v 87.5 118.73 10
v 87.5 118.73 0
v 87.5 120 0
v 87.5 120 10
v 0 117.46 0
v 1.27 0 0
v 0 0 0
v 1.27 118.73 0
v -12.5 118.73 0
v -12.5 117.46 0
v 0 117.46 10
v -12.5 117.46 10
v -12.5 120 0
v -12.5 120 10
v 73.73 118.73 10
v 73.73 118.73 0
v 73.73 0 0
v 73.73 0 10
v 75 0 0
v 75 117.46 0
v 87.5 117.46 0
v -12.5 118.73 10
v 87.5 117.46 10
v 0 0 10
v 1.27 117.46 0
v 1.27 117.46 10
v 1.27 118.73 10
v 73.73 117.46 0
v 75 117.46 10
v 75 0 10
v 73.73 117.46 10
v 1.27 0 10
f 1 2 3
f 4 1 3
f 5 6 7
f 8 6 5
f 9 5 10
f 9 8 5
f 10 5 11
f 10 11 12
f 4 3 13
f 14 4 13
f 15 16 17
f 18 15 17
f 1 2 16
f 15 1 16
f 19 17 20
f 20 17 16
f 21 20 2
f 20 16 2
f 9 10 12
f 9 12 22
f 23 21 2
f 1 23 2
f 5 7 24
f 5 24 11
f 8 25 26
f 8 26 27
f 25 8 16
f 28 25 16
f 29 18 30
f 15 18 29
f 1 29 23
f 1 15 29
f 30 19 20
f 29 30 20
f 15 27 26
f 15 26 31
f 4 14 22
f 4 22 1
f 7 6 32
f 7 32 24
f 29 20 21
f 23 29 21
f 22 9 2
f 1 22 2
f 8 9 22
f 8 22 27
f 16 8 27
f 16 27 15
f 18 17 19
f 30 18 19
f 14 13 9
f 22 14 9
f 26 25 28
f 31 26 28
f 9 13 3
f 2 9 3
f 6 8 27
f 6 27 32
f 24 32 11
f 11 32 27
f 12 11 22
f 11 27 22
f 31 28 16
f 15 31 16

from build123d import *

# Parameters (mm, degrees)
BOSS_EXTRUDE1_DEPTH   = 10
BOSS_EXTRUDE1_2_DEPTH = 10
SKETCH2_4_W           = 72.46
SKETCH2_4_H           = 1.27
BOSS_EXTRUDE2_DEPTH   = 10
BOSS_EXTRUDE3_DEPTH   = 10


with BuildPart() as part:
    # Sketch2 → Boss-Extrude1 (new body)
    with BuildSketch(Plane.XY):
        Polygon((0, 117.46), (0, 0), (1.27, 0), (1.27, 118.73), (-12.5, 118.73), (-12.5, 117.46), align=None)
    extrude(amount=BOSS_EXTRUDE1_DEPTH)


with BuildPart() as body_2:
    # Sketch2 → Boss-Extrude1 2 (new body)
    with BuildSketch(Plane.XY):
        Polygon((73.73, 118.73), (73.73, 0), (75, 0), (75, 117.46), (87.5, 117.46), (87.5, 118.73), align=None)
    extrude(amount=BOSS_EXTRUDE1_2_DEPTH)


with BuildPart() as body_3:
    # Sketch2<4> → Boss-Extrude2 (new body)
    with BuildSketch(Plane.XY):
        with Locations((37.5, 118.095)):
            Rectangle(SKETCH2_4_W, SKETCH2_4_H)
    extrude(amount=BOSS_EXTRUDE2_DEPTH)


with BuildPart() as body_4:
    # Sketch2<5> → Boss-Extrude3 (new body)
    with BuildSketch(Plane.XY):
        Polygon((-12.5, 120), (-12.5, 118.73), (1.27, 118.73), (73.73, 118.73), (87.5, 118.73), (87.5, 120), align=None)
    extrude(amount=BOSS_EXTRUDE3_DEPTH)


solid = Compound([part.part, body_2.part, body_3.part, body_4.part])
